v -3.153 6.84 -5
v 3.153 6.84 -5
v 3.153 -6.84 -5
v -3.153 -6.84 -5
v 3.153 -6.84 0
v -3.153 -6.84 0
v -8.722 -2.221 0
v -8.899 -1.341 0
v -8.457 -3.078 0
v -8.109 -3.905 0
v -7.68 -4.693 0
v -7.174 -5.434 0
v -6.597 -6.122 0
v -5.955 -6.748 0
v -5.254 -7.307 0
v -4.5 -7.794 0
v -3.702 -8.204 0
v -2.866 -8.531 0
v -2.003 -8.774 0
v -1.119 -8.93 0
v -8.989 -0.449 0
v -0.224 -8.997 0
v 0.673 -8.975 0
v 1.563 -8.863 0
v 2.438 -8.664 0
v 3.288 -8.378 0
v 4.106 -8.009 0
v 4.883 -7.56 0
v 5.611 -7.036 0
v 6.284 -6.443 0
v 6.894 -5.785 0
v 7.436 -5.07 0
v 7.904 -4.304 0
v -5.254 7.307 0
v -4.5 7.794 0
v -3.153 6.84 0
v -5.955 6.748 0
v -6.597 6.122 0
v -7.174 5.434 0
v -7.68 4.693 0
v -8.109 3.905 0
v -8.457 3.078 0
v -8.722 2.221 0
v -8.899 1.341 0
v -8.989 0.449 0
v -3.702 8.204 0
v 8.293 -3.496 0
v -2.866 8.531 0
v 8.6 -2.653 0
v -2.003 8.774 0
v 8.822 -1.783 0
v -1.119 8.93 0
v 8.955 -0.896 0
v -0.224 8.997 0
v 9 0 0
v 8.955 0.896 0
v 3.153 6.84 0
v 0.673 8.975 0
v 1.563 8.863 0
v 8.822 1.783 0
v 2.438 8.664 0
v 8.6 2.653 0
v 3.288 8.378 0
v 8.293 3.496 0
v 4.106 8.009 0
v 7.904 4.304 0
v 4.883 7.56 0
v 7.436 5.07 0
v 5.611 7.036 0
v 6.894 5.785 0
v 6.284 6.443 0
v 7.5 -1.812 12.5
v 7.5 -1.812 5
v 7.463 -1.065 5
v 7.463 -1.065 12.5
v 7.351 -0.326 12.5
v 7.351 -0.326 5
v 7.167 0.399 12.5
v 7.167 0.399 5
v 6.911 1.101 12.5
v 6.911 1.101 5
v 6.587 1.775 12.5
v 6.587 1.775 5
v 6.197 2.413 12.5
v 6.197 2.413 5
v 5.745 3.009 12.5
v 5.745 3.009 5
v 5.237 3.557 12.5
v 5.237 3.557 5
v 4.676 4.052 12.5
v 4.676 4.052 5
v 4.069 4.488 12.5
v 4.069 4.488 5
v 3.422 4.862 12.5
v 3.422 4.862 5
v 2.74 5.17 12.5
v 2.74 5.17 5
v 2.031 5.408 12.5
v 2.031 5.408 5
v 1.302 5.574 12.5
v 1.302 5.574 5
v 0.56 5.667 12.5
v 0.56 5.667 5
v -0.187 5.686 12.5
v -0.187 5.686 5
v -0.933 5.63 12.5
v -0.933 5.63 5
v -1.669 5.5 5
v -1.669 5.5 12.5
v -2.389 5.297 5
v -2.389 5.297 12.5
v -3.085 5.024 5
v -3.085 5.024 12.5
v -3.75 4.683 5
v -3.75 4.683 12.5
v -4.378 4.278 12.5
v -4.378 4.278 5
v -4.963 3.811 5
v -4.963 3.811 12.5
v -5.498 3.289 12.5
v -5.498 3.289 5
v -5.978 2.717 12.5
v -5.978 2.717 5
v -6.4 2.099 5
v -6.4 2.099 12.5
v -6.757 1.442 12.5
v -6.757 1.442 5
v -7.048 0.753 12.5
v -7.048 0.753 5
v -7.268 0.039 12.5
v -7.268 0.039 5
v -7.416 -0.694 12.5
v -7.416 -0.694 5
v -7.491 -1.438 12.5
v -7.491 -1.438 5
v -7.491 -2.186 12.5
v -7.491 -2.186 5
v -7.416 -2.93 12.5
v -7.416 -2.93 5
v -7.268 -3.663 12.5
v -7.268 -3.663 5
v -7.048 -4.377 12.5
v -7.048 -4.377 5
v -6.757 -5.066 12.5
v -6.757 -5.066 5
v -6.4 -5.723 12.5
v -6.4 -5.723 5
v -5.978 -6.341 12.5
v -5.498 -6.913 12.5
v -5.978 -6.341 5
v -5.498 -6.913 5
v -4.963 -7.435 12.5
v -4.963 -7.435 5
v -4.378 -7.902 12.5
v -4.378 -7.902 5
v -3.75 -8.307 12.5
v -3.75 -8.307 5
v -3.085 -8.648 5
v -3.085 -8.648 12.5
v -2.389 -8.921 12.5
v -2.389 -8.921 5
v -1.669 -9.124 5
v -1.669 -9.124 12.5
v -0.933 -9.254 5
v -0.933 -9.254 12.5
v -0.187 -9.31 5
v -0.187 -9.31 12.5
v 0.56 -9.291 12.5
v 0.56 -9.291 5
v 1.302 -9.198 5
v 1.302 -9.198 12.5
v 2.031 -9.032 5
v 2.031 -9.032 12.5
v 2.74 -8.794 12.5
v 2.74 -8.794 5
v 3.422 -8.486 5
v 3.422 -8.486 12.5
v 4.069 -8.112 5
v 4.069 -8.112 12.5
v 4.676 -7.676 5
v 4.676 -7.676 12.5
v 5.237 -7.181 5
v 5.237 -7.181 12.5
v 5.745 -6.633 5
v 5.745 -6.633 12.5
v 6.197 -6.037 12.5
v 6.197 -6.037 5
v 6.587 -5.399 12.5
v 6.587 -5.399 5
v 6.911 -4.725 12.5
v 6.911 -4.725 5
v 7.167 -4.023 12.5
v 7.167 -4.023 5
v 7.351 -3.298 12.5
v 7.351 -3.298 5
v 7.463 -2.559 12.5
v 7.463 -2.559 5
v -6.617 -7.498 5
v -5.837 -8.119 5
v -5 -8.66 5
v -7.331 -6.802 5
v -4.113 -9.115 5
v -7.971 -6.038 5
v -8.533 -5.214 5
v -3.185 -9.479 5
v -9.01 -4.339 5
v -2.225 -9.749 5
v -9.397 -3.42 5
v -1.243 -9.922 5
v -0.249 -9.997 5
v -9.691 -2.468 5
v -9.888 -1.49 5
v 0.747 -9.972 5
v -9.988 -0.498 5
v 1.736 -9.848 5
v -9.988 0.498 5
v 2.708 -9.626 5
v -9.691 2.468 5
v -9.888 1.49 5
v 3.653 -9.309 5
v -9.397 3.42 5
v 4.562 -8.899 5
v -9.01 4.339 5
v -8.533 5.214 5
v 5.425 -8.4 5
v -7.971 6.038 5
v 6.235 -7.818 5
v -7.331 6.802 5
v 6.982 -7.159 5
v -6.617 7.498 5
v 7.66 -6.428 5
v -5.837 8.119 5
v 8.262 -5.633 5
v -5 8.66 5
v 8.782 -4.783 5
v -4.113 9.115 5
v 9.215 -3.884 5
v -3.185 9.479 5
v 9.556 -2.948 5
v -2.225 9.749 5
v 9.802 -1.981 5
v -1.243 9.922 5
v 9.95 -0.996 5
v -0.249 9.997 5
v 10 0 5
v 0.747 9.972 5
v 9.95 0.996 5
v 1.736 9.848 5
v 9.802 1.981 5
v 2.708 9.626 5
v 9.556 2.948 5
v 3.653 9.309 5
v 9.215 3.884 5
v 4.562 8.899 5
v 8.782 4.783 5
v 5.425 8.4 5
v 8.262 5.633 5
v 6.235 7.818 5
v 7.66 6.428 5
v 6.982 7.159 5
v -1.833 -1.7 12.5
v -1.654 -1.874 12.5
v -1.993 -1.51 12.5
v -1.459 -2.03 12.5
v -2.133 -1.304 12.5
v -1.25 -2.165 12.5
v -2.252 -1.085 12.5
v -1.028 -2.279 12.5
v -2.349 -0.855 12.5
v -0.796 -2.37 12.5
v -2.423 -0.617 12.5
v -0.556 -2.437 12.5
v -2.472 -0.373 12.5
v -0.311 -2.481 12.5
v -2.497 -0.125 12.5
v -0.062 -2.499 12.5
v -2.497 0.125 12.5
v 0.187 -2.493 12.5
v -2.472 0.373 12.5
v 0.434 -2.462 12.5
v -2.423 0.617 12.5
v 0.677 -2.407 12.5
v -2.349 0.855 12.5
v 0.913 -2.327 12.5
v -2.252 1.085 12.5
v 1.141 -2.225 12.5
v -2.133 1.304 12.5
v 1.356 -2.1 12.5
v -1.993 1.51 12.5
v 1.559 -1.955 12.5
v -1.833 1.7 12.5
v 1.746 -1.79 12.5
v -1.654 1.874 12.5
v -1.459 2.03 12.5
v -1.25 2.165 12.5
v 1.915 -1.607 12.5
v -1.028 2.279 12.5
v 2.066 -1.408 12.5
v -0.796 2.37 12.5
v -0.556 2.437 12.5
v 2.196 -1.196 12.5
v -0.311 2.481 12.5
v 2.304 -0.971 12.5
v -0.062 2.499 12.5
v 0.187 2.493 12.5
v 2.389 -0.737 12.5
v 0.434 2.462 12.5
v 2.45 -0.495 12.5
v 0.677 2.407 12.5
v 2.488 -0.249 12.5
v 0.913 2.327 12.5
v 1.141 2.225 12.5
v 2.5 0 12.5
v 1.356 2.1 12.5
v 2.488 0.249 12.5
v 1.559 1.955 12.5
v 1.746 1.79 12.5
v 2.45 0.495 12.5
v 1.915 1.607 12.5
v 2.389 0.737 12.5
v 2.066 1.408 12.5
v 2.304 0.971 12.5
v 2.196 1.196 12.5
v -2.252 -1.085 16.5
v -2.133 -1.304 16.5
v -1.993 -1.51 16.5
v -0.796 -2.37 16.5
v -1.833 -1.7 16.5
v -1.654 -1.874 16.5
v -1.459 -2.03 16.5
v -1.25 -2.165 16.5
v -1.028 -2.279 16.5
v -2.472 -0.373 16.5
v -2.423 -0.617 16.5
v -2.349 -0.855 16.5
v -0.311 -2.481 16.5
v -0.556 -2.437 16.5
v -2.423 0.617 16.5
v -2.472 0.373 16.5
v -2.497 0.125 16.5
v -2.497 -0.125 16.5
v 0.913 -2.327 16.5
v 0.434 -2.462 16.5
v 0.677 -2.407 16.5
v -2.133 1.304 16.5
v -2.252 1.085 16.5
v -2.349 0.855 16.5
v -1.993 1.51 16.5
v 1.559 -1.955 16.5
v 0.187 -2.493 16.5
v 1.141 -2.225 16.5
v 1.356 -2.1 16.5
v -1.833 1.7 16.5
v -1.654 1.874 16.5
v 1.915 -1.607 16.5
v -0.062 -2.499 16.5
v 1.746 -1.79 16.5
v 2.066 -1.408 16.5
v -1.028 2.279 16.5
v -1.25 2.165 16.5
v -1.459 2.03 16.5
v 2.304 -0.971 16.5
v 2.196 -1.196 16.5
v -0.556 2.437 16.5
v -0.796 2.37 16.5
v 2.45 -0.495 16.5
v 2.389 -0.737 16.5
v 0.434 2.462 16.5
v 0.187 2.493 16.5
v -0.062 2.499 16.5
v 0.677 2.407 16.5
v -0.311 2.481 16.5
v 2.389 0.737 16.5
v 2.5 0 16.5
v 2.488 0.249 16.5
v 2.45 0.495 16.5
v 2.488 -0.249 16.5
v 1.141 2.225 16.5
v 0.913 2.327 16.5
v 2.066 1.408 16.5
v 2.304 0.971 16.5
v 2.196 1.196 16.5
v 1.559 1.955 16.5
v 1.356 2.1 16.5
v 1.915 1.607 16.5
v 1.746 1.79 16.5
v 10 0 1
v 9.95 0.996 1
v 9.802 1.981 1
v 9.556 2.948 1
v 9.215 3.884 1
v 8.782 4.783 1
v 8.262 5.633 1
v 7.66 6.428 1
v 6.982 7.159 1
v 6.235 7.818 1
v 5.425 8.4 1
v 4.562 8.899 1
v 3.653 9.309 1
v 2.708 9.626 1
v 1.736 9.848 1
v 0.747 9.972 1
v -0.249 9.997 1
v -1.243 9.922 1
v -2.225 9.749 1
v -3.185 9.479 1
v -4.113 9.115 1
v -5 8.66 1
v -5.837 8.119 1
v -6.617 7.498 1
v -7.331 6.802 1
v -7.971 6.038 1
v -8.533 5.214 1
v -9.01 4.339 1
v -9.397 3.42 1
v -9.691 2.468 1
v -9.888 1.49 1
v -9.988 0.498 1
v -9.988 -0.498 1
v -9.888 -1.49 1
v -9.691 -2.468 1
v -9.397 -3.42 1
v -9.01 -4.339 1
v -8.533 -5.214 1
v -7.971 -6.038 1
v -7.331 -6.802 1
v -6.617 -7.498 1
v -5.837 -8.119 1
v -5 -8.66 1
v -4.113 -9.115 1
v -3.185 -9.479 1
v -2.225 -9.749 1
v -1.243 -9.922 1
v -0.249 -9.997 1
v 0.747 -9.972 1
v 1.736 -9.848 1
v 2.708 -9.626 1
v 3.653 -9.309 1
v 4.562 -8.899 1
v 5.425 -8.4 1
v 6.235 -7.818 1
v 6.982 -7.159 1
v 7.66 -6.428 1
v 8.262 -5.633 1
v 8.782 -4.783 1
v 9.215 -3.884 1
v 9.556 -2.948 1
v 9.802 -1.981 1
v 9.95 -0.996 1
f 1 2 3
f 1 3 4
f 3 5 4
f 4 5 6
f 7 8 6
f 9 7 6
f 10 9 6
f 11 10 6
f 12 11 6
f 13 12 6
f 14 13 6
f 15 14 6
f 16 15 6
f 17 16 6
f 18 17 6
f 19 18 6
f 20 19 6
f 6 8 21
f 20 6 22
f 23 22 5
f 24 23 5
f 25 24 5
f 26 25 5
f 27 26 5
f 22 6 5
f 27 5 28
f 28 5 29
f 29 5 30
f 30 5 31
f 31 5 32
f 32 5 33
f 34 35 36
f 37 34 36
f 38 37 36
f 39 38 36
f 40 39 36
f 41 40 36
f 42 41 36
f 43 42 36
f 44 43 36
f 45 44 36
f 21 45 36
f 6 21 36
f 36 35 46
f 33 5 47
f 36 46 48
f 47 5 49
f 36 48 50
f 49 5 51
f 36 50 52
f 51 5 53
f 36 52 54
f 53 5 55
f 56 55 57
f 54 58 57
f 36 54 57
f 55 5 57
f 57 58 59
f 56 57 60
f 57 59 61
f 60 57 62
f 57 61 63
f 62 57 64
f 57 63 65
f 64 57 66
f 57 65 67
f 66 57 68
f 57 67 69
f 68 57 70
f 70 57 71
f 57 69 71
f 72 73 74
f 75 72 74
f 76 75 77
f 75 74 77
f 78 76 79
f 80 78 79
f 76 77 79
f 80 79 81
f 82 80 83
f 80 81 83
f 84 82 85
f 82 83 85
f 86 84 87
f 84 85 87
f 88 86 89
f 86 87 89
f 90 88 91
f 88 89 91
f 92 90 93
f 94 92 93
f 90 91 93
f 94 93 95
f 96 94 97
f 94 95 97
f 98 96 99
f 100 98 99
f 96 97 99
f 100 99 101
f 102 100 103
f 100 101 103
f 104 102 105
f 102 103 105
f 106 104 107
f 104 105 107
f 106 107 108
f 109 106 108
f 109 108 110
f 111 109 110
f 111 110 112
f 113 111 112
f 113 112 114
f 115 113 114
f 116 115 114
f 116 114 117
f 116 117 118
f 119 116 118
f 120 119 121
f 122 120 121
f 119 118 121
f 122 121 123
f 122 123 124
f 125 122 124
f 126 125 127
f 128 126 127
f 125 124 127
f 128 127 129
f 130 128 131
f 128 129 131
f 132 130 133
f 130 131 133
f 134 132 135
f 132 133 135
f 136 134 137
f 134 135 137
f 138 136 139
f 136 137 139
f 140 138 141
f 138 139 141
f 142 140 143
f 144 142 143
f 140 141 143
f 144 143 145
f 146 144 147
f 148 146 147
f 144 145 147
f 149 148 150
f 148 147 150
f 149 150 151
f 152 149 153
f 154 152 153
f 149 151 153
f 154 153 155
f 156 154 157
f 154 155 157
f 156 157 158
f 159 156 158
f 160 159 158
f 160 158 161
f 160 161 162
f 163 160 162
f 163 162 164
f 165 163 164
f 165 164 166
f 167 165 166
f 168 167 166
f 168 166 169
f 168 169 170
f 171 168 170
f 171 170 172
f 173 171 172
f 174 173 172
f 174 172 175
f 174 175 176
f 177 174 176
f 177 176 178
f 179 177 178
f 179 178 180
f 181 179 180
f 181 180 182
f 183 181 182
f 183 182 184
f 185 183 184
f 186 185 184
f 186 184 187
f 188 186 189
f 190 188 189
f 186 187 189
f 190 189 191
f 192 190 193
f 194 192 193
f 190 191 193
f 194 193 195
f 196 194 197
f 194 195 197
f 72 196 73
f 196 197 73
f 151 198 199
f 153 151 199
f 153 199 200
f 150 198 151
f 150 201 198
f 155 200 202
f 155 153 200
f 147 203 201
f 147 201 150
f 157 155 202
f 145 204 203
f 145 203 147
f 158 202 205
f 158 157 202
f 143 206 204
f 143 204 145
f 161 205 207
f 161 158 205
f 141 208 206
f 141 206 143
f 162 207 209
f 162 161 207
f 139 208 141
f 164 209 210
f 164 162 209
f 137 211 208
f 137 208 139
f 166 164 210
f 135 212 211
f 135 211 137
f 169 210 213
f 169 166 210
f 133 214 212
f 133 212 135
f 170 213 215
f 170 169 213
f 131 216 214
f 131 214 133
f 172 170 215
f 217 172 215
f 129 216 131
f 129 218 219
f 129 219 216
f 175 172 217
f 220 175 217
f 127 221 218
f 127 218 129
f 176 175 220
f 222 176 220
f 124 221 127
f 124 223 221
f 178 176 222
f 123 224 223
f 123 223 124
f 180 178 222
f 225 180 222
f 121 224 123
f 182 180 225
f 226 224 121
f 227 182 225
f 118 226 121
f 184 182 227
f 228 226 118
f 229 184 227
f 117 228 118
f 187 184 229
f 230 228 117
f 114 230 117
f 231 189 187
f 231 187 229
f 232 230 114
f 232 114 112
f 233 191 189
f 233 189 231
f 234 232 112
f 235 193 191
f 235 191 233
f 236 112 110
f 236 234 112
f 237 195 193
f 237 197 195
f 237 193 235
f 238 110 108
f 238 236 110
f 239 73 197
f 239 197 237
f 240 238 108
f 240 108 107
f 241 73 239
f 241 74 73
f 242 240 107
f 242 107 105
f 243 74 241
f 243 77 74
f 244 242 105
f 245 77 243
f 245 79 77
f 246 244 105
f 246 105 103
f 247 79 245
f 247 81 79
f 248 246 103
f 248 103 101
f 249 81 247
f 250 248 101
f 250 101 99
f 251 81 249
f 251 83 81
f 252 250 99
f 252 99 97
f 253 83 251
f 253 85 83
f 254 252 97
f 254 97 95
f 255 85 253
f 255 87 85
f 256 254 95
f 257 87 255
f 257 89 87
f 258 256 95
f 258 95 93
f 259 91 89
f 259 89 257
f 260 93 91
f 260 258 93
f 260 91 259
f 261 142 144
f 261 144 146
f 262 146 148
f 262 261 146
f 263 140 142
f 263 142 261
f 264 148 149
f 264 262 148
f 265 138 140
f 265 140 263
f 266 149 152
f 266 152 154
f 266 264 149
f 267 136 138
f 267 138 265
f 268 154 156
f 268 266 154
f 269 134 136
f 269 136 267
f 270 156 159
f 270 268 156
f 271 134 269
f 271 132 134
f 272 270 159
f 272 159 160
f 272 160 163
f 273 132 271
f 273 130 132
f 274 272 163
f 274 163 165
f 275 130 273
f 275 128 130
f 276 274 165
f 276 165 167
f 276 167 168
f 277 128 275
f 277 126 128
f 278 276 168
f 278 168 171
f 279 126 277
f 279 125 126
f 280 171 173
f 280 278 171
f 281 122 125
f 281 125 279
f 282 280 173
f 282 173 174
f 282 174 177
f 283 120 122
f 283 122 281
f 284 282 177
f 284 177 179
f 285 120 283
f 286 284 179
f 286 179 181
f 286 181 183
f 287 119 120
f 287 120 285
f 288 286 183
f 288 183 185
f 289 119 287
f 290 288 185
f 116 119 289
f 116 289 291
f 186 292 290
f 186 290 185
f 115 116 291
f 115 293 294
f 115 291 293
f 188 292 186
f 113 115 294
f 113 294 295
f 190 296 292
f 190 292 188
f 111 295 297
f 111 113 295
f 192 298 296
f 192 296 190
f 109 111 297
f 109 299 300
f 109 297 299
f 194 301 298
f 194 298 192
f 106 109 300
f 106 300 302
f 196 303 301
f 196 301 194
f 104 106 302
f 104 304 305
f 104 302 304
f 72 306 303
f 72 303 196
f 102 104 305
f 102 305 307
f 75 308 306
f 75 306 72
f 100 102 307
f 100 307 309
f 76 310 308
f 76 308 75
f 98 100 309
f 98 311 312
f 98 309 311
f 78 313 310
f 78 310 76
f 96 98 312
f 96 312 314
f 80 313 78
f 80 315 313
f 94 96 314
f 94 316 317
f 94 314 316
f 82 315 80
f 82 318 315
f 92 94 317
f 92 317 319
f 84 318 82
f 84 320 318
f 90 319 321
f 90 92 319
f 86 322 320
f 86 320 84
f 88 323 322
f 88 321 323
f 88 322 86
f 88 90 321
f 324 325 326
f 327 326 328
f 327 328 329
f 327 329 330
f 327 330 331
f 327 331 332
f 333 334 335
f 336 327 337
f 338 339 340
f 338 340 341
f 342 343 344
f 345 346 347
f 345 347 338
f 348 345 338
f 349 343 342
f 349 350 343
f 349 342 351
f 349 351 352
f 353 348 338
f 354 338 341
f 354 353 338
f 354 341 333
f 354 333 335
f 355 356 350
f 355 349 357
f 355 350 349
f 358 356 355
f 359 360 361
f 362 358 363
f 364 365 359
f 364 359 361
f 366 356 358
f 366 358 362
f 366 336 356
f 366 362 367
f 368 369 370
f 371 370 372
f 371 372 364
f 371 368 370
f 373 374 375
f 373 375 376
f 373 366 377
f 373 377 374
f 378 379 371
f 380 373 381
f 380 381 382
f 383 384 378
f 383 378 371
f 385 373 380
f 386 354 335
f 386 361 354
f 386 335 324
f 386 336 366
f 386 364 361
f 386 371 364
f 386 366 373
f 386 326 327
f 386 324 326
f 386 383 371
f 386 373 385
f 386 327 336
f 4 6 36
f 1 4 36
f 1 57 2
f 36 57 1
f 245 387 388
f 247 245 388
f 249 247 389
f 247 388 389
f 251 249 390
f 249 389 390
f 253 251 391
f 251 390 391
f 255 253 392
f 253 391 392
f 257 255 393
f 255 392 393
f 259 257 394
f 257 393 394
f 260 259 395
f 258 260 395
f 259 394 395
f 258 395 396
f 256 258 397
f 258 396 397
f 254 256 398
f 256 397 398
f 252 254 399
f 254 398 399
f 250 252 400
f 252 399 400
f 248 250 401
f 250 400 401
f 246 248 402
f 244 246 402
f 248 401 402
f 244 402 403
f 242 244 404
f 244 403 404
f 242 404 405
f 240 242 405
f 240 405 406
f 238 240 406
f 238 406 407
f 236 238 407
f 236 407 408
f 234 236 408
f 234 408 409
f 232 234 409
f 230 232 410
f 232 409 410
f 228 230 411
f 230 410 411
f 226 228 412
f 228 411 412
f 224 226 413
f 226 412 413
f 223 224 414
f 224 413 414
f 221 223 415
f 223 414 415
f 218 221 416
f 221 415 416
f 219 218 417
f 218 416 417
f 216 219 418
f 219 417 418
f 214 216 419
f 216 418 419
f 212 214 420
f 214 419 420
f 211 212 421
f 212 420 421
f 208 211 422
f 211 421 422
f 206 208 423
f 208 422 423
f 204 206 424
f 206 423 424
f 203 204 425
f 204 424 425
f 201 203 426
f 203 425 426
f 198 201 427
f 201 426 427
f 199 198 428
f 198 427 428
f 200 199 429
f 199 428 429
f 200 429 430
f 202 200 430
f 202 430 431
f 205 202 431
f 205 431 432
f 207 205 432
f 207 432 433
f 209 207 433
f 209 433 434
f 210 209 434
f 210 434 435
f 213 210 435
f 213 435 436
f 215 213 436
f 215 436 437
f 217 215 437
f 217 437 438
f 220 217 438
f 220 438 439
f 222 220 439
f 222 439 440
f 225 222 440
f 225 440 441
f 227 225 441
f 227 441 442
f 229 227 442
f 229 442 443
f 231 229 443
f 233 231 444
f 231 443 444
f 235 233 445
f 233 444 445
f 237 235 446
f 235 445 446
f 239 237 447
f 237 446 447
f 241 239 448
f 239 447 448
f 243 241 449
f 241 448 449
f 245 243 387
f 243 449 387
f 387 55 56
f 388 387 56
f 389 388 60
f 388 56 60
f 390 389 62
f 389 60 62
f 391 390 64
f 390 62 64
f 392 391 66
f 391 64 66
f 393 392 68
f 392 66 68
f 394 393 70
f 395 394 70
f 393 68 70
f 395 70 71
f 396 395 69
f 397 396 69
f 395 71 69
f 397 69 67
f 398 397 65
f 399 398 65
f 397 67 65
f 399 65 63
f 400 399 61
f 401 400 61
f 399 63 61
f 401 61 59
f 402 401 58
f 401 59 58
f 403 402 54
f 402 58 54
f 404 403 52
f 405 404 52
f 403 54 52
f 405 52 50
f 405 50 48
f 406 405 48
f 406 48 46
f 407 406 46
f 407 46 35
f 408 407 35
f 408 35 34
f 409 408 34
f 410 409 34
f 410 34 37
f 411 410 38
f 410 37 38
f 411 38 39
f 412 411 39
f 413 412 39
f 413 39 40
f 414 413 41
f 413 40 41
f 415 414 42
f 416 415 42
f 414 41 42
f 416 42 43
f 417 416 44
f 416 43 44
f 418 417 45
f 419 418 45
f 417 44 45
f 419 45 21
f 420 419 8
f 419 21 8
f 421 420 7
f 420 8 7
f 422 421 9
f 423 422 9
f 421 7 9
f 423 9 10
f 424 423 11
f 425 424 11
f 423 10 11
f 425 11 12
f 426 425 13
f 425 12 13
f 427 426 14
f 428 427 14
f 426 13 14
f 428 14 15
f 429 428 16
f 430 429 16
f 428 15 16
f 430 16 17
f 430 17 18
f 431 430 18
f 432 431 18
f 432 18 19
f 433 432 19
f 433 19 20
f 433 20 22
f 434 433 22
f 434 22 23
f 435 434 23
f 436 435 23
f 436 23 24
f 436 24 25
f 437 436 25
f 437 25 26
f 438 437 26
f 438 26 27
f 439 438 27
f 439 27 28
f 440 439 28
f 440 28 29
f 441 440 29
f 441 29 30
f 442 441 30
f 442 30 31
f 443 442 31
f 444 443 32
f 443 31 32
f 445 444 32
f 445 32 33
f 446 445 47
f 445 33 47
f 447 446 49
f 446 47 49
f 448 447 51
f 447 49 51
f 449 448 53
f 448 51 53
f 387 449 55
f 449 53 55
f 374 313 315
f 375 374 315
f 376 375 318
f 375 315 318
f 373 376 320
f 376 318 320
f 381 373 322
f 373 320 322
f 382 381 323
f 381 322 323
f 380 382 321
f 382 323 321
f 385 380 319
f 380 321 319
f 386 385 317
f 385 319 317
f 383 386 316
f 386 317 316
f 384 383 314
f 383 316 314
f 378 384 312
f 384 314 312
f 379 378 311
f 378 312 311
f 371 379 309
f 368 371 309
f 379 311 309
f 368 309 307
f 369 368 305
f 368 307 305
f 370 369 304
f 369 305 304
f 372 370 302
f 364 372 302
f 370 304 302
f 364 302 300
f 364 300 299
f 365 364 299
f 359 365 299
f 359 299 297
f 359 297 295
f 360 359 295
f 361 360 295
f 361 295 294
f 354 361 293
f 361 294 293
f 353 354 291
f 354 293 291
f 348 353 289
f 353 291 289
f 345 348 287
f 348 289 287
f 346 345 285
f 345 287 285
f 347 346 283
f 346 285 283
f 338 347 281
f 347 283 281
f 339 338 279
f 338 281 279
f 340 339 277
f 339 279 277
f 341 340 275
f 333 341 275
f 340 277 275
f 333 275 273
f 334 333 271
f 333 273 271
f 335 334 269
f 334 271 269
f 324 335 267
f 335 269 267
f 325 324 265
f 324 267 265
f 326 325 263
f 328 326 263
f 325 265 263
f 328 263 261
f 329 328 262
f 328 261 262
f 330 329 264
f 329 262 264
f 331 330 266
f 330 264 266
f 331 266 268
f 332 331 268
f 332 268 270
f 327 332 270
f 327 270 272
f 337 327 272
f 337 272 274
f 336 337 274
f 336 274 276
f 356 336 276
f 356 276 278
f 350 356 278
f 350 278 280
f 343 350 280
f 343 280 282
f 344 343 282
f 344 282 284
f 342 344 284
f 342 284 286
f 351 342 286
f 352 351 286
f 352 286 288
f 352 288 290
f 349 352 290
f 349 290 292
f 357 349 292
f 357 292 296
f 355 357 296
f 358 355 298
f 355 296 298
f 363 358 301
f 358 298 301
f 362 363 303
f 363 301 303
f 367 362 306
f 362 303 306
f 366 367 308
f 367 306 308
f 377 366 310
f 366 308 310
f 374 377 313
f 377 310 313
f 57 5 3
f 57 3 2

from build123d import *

# Parameters (mm, degrees)
SKETCH1_R           = 10
BOSS_EXTRUDE1_DEPTH = 5
SKETCH2_R           = 7.5
BOSS_EXTRUDE2_DEPTH = 7.5
SKETCH3_R           = 2.5
BOSS_EXTRUDE3_DEPTH = 4
SKETCH4_W           = 6.306649828
SKETCH4_H           = 13.679653114
BOSS_EXTRUDE4_DEPTH = 5
CHAMFER2_SIZE       = 1


with BuildPart() as part:
    # Sketch1 → Boss-Extrude1 (new body)
    with BuildSketch(Plane.XY):
        Circle(SKETCH1_R)
    extrude(amount=BOSS_EXTRUDE1_DEPTH)

    # Sketch2 → Boss-Extrude2 (add)
    with BuildSketch(Plane.XY.offset(5)):
        with Locations((0, -1.812)):
            Circle(SKETCH2_R)
    extrude(amount=BOSS_EXTRUDE2_DEPTH)

    # Sketch3 → Boss-Extrude3 (add)
    with BuildSketch(Plane.XY.offset(12.5)):
        Circle(SKETCH3_R)
    extrude(amount=BOSS_EXTRUDE3_DEPTH)

    # Sketch4 → Boss-Extrude4 (add)
    with BuildSketch(Plane(origin=(0, 0, 0), x_dir=(-1, 0, 0), z_dir=(0, 0, -1))):
        Rectangle(SKETCH4_W, SKETCH4_H)
    extrude(amount=BOSS_EXTRUDE4_DEPTH)

    # Chamfer2
    chamfer2_edges = [part.edges().sort_by_distance(p)[0] for p in [
        (-10, 0, 0),
    ]]
    chamfer(chamfer2_edges, length=CHAMFER2_SIZE)


solid = part.part
